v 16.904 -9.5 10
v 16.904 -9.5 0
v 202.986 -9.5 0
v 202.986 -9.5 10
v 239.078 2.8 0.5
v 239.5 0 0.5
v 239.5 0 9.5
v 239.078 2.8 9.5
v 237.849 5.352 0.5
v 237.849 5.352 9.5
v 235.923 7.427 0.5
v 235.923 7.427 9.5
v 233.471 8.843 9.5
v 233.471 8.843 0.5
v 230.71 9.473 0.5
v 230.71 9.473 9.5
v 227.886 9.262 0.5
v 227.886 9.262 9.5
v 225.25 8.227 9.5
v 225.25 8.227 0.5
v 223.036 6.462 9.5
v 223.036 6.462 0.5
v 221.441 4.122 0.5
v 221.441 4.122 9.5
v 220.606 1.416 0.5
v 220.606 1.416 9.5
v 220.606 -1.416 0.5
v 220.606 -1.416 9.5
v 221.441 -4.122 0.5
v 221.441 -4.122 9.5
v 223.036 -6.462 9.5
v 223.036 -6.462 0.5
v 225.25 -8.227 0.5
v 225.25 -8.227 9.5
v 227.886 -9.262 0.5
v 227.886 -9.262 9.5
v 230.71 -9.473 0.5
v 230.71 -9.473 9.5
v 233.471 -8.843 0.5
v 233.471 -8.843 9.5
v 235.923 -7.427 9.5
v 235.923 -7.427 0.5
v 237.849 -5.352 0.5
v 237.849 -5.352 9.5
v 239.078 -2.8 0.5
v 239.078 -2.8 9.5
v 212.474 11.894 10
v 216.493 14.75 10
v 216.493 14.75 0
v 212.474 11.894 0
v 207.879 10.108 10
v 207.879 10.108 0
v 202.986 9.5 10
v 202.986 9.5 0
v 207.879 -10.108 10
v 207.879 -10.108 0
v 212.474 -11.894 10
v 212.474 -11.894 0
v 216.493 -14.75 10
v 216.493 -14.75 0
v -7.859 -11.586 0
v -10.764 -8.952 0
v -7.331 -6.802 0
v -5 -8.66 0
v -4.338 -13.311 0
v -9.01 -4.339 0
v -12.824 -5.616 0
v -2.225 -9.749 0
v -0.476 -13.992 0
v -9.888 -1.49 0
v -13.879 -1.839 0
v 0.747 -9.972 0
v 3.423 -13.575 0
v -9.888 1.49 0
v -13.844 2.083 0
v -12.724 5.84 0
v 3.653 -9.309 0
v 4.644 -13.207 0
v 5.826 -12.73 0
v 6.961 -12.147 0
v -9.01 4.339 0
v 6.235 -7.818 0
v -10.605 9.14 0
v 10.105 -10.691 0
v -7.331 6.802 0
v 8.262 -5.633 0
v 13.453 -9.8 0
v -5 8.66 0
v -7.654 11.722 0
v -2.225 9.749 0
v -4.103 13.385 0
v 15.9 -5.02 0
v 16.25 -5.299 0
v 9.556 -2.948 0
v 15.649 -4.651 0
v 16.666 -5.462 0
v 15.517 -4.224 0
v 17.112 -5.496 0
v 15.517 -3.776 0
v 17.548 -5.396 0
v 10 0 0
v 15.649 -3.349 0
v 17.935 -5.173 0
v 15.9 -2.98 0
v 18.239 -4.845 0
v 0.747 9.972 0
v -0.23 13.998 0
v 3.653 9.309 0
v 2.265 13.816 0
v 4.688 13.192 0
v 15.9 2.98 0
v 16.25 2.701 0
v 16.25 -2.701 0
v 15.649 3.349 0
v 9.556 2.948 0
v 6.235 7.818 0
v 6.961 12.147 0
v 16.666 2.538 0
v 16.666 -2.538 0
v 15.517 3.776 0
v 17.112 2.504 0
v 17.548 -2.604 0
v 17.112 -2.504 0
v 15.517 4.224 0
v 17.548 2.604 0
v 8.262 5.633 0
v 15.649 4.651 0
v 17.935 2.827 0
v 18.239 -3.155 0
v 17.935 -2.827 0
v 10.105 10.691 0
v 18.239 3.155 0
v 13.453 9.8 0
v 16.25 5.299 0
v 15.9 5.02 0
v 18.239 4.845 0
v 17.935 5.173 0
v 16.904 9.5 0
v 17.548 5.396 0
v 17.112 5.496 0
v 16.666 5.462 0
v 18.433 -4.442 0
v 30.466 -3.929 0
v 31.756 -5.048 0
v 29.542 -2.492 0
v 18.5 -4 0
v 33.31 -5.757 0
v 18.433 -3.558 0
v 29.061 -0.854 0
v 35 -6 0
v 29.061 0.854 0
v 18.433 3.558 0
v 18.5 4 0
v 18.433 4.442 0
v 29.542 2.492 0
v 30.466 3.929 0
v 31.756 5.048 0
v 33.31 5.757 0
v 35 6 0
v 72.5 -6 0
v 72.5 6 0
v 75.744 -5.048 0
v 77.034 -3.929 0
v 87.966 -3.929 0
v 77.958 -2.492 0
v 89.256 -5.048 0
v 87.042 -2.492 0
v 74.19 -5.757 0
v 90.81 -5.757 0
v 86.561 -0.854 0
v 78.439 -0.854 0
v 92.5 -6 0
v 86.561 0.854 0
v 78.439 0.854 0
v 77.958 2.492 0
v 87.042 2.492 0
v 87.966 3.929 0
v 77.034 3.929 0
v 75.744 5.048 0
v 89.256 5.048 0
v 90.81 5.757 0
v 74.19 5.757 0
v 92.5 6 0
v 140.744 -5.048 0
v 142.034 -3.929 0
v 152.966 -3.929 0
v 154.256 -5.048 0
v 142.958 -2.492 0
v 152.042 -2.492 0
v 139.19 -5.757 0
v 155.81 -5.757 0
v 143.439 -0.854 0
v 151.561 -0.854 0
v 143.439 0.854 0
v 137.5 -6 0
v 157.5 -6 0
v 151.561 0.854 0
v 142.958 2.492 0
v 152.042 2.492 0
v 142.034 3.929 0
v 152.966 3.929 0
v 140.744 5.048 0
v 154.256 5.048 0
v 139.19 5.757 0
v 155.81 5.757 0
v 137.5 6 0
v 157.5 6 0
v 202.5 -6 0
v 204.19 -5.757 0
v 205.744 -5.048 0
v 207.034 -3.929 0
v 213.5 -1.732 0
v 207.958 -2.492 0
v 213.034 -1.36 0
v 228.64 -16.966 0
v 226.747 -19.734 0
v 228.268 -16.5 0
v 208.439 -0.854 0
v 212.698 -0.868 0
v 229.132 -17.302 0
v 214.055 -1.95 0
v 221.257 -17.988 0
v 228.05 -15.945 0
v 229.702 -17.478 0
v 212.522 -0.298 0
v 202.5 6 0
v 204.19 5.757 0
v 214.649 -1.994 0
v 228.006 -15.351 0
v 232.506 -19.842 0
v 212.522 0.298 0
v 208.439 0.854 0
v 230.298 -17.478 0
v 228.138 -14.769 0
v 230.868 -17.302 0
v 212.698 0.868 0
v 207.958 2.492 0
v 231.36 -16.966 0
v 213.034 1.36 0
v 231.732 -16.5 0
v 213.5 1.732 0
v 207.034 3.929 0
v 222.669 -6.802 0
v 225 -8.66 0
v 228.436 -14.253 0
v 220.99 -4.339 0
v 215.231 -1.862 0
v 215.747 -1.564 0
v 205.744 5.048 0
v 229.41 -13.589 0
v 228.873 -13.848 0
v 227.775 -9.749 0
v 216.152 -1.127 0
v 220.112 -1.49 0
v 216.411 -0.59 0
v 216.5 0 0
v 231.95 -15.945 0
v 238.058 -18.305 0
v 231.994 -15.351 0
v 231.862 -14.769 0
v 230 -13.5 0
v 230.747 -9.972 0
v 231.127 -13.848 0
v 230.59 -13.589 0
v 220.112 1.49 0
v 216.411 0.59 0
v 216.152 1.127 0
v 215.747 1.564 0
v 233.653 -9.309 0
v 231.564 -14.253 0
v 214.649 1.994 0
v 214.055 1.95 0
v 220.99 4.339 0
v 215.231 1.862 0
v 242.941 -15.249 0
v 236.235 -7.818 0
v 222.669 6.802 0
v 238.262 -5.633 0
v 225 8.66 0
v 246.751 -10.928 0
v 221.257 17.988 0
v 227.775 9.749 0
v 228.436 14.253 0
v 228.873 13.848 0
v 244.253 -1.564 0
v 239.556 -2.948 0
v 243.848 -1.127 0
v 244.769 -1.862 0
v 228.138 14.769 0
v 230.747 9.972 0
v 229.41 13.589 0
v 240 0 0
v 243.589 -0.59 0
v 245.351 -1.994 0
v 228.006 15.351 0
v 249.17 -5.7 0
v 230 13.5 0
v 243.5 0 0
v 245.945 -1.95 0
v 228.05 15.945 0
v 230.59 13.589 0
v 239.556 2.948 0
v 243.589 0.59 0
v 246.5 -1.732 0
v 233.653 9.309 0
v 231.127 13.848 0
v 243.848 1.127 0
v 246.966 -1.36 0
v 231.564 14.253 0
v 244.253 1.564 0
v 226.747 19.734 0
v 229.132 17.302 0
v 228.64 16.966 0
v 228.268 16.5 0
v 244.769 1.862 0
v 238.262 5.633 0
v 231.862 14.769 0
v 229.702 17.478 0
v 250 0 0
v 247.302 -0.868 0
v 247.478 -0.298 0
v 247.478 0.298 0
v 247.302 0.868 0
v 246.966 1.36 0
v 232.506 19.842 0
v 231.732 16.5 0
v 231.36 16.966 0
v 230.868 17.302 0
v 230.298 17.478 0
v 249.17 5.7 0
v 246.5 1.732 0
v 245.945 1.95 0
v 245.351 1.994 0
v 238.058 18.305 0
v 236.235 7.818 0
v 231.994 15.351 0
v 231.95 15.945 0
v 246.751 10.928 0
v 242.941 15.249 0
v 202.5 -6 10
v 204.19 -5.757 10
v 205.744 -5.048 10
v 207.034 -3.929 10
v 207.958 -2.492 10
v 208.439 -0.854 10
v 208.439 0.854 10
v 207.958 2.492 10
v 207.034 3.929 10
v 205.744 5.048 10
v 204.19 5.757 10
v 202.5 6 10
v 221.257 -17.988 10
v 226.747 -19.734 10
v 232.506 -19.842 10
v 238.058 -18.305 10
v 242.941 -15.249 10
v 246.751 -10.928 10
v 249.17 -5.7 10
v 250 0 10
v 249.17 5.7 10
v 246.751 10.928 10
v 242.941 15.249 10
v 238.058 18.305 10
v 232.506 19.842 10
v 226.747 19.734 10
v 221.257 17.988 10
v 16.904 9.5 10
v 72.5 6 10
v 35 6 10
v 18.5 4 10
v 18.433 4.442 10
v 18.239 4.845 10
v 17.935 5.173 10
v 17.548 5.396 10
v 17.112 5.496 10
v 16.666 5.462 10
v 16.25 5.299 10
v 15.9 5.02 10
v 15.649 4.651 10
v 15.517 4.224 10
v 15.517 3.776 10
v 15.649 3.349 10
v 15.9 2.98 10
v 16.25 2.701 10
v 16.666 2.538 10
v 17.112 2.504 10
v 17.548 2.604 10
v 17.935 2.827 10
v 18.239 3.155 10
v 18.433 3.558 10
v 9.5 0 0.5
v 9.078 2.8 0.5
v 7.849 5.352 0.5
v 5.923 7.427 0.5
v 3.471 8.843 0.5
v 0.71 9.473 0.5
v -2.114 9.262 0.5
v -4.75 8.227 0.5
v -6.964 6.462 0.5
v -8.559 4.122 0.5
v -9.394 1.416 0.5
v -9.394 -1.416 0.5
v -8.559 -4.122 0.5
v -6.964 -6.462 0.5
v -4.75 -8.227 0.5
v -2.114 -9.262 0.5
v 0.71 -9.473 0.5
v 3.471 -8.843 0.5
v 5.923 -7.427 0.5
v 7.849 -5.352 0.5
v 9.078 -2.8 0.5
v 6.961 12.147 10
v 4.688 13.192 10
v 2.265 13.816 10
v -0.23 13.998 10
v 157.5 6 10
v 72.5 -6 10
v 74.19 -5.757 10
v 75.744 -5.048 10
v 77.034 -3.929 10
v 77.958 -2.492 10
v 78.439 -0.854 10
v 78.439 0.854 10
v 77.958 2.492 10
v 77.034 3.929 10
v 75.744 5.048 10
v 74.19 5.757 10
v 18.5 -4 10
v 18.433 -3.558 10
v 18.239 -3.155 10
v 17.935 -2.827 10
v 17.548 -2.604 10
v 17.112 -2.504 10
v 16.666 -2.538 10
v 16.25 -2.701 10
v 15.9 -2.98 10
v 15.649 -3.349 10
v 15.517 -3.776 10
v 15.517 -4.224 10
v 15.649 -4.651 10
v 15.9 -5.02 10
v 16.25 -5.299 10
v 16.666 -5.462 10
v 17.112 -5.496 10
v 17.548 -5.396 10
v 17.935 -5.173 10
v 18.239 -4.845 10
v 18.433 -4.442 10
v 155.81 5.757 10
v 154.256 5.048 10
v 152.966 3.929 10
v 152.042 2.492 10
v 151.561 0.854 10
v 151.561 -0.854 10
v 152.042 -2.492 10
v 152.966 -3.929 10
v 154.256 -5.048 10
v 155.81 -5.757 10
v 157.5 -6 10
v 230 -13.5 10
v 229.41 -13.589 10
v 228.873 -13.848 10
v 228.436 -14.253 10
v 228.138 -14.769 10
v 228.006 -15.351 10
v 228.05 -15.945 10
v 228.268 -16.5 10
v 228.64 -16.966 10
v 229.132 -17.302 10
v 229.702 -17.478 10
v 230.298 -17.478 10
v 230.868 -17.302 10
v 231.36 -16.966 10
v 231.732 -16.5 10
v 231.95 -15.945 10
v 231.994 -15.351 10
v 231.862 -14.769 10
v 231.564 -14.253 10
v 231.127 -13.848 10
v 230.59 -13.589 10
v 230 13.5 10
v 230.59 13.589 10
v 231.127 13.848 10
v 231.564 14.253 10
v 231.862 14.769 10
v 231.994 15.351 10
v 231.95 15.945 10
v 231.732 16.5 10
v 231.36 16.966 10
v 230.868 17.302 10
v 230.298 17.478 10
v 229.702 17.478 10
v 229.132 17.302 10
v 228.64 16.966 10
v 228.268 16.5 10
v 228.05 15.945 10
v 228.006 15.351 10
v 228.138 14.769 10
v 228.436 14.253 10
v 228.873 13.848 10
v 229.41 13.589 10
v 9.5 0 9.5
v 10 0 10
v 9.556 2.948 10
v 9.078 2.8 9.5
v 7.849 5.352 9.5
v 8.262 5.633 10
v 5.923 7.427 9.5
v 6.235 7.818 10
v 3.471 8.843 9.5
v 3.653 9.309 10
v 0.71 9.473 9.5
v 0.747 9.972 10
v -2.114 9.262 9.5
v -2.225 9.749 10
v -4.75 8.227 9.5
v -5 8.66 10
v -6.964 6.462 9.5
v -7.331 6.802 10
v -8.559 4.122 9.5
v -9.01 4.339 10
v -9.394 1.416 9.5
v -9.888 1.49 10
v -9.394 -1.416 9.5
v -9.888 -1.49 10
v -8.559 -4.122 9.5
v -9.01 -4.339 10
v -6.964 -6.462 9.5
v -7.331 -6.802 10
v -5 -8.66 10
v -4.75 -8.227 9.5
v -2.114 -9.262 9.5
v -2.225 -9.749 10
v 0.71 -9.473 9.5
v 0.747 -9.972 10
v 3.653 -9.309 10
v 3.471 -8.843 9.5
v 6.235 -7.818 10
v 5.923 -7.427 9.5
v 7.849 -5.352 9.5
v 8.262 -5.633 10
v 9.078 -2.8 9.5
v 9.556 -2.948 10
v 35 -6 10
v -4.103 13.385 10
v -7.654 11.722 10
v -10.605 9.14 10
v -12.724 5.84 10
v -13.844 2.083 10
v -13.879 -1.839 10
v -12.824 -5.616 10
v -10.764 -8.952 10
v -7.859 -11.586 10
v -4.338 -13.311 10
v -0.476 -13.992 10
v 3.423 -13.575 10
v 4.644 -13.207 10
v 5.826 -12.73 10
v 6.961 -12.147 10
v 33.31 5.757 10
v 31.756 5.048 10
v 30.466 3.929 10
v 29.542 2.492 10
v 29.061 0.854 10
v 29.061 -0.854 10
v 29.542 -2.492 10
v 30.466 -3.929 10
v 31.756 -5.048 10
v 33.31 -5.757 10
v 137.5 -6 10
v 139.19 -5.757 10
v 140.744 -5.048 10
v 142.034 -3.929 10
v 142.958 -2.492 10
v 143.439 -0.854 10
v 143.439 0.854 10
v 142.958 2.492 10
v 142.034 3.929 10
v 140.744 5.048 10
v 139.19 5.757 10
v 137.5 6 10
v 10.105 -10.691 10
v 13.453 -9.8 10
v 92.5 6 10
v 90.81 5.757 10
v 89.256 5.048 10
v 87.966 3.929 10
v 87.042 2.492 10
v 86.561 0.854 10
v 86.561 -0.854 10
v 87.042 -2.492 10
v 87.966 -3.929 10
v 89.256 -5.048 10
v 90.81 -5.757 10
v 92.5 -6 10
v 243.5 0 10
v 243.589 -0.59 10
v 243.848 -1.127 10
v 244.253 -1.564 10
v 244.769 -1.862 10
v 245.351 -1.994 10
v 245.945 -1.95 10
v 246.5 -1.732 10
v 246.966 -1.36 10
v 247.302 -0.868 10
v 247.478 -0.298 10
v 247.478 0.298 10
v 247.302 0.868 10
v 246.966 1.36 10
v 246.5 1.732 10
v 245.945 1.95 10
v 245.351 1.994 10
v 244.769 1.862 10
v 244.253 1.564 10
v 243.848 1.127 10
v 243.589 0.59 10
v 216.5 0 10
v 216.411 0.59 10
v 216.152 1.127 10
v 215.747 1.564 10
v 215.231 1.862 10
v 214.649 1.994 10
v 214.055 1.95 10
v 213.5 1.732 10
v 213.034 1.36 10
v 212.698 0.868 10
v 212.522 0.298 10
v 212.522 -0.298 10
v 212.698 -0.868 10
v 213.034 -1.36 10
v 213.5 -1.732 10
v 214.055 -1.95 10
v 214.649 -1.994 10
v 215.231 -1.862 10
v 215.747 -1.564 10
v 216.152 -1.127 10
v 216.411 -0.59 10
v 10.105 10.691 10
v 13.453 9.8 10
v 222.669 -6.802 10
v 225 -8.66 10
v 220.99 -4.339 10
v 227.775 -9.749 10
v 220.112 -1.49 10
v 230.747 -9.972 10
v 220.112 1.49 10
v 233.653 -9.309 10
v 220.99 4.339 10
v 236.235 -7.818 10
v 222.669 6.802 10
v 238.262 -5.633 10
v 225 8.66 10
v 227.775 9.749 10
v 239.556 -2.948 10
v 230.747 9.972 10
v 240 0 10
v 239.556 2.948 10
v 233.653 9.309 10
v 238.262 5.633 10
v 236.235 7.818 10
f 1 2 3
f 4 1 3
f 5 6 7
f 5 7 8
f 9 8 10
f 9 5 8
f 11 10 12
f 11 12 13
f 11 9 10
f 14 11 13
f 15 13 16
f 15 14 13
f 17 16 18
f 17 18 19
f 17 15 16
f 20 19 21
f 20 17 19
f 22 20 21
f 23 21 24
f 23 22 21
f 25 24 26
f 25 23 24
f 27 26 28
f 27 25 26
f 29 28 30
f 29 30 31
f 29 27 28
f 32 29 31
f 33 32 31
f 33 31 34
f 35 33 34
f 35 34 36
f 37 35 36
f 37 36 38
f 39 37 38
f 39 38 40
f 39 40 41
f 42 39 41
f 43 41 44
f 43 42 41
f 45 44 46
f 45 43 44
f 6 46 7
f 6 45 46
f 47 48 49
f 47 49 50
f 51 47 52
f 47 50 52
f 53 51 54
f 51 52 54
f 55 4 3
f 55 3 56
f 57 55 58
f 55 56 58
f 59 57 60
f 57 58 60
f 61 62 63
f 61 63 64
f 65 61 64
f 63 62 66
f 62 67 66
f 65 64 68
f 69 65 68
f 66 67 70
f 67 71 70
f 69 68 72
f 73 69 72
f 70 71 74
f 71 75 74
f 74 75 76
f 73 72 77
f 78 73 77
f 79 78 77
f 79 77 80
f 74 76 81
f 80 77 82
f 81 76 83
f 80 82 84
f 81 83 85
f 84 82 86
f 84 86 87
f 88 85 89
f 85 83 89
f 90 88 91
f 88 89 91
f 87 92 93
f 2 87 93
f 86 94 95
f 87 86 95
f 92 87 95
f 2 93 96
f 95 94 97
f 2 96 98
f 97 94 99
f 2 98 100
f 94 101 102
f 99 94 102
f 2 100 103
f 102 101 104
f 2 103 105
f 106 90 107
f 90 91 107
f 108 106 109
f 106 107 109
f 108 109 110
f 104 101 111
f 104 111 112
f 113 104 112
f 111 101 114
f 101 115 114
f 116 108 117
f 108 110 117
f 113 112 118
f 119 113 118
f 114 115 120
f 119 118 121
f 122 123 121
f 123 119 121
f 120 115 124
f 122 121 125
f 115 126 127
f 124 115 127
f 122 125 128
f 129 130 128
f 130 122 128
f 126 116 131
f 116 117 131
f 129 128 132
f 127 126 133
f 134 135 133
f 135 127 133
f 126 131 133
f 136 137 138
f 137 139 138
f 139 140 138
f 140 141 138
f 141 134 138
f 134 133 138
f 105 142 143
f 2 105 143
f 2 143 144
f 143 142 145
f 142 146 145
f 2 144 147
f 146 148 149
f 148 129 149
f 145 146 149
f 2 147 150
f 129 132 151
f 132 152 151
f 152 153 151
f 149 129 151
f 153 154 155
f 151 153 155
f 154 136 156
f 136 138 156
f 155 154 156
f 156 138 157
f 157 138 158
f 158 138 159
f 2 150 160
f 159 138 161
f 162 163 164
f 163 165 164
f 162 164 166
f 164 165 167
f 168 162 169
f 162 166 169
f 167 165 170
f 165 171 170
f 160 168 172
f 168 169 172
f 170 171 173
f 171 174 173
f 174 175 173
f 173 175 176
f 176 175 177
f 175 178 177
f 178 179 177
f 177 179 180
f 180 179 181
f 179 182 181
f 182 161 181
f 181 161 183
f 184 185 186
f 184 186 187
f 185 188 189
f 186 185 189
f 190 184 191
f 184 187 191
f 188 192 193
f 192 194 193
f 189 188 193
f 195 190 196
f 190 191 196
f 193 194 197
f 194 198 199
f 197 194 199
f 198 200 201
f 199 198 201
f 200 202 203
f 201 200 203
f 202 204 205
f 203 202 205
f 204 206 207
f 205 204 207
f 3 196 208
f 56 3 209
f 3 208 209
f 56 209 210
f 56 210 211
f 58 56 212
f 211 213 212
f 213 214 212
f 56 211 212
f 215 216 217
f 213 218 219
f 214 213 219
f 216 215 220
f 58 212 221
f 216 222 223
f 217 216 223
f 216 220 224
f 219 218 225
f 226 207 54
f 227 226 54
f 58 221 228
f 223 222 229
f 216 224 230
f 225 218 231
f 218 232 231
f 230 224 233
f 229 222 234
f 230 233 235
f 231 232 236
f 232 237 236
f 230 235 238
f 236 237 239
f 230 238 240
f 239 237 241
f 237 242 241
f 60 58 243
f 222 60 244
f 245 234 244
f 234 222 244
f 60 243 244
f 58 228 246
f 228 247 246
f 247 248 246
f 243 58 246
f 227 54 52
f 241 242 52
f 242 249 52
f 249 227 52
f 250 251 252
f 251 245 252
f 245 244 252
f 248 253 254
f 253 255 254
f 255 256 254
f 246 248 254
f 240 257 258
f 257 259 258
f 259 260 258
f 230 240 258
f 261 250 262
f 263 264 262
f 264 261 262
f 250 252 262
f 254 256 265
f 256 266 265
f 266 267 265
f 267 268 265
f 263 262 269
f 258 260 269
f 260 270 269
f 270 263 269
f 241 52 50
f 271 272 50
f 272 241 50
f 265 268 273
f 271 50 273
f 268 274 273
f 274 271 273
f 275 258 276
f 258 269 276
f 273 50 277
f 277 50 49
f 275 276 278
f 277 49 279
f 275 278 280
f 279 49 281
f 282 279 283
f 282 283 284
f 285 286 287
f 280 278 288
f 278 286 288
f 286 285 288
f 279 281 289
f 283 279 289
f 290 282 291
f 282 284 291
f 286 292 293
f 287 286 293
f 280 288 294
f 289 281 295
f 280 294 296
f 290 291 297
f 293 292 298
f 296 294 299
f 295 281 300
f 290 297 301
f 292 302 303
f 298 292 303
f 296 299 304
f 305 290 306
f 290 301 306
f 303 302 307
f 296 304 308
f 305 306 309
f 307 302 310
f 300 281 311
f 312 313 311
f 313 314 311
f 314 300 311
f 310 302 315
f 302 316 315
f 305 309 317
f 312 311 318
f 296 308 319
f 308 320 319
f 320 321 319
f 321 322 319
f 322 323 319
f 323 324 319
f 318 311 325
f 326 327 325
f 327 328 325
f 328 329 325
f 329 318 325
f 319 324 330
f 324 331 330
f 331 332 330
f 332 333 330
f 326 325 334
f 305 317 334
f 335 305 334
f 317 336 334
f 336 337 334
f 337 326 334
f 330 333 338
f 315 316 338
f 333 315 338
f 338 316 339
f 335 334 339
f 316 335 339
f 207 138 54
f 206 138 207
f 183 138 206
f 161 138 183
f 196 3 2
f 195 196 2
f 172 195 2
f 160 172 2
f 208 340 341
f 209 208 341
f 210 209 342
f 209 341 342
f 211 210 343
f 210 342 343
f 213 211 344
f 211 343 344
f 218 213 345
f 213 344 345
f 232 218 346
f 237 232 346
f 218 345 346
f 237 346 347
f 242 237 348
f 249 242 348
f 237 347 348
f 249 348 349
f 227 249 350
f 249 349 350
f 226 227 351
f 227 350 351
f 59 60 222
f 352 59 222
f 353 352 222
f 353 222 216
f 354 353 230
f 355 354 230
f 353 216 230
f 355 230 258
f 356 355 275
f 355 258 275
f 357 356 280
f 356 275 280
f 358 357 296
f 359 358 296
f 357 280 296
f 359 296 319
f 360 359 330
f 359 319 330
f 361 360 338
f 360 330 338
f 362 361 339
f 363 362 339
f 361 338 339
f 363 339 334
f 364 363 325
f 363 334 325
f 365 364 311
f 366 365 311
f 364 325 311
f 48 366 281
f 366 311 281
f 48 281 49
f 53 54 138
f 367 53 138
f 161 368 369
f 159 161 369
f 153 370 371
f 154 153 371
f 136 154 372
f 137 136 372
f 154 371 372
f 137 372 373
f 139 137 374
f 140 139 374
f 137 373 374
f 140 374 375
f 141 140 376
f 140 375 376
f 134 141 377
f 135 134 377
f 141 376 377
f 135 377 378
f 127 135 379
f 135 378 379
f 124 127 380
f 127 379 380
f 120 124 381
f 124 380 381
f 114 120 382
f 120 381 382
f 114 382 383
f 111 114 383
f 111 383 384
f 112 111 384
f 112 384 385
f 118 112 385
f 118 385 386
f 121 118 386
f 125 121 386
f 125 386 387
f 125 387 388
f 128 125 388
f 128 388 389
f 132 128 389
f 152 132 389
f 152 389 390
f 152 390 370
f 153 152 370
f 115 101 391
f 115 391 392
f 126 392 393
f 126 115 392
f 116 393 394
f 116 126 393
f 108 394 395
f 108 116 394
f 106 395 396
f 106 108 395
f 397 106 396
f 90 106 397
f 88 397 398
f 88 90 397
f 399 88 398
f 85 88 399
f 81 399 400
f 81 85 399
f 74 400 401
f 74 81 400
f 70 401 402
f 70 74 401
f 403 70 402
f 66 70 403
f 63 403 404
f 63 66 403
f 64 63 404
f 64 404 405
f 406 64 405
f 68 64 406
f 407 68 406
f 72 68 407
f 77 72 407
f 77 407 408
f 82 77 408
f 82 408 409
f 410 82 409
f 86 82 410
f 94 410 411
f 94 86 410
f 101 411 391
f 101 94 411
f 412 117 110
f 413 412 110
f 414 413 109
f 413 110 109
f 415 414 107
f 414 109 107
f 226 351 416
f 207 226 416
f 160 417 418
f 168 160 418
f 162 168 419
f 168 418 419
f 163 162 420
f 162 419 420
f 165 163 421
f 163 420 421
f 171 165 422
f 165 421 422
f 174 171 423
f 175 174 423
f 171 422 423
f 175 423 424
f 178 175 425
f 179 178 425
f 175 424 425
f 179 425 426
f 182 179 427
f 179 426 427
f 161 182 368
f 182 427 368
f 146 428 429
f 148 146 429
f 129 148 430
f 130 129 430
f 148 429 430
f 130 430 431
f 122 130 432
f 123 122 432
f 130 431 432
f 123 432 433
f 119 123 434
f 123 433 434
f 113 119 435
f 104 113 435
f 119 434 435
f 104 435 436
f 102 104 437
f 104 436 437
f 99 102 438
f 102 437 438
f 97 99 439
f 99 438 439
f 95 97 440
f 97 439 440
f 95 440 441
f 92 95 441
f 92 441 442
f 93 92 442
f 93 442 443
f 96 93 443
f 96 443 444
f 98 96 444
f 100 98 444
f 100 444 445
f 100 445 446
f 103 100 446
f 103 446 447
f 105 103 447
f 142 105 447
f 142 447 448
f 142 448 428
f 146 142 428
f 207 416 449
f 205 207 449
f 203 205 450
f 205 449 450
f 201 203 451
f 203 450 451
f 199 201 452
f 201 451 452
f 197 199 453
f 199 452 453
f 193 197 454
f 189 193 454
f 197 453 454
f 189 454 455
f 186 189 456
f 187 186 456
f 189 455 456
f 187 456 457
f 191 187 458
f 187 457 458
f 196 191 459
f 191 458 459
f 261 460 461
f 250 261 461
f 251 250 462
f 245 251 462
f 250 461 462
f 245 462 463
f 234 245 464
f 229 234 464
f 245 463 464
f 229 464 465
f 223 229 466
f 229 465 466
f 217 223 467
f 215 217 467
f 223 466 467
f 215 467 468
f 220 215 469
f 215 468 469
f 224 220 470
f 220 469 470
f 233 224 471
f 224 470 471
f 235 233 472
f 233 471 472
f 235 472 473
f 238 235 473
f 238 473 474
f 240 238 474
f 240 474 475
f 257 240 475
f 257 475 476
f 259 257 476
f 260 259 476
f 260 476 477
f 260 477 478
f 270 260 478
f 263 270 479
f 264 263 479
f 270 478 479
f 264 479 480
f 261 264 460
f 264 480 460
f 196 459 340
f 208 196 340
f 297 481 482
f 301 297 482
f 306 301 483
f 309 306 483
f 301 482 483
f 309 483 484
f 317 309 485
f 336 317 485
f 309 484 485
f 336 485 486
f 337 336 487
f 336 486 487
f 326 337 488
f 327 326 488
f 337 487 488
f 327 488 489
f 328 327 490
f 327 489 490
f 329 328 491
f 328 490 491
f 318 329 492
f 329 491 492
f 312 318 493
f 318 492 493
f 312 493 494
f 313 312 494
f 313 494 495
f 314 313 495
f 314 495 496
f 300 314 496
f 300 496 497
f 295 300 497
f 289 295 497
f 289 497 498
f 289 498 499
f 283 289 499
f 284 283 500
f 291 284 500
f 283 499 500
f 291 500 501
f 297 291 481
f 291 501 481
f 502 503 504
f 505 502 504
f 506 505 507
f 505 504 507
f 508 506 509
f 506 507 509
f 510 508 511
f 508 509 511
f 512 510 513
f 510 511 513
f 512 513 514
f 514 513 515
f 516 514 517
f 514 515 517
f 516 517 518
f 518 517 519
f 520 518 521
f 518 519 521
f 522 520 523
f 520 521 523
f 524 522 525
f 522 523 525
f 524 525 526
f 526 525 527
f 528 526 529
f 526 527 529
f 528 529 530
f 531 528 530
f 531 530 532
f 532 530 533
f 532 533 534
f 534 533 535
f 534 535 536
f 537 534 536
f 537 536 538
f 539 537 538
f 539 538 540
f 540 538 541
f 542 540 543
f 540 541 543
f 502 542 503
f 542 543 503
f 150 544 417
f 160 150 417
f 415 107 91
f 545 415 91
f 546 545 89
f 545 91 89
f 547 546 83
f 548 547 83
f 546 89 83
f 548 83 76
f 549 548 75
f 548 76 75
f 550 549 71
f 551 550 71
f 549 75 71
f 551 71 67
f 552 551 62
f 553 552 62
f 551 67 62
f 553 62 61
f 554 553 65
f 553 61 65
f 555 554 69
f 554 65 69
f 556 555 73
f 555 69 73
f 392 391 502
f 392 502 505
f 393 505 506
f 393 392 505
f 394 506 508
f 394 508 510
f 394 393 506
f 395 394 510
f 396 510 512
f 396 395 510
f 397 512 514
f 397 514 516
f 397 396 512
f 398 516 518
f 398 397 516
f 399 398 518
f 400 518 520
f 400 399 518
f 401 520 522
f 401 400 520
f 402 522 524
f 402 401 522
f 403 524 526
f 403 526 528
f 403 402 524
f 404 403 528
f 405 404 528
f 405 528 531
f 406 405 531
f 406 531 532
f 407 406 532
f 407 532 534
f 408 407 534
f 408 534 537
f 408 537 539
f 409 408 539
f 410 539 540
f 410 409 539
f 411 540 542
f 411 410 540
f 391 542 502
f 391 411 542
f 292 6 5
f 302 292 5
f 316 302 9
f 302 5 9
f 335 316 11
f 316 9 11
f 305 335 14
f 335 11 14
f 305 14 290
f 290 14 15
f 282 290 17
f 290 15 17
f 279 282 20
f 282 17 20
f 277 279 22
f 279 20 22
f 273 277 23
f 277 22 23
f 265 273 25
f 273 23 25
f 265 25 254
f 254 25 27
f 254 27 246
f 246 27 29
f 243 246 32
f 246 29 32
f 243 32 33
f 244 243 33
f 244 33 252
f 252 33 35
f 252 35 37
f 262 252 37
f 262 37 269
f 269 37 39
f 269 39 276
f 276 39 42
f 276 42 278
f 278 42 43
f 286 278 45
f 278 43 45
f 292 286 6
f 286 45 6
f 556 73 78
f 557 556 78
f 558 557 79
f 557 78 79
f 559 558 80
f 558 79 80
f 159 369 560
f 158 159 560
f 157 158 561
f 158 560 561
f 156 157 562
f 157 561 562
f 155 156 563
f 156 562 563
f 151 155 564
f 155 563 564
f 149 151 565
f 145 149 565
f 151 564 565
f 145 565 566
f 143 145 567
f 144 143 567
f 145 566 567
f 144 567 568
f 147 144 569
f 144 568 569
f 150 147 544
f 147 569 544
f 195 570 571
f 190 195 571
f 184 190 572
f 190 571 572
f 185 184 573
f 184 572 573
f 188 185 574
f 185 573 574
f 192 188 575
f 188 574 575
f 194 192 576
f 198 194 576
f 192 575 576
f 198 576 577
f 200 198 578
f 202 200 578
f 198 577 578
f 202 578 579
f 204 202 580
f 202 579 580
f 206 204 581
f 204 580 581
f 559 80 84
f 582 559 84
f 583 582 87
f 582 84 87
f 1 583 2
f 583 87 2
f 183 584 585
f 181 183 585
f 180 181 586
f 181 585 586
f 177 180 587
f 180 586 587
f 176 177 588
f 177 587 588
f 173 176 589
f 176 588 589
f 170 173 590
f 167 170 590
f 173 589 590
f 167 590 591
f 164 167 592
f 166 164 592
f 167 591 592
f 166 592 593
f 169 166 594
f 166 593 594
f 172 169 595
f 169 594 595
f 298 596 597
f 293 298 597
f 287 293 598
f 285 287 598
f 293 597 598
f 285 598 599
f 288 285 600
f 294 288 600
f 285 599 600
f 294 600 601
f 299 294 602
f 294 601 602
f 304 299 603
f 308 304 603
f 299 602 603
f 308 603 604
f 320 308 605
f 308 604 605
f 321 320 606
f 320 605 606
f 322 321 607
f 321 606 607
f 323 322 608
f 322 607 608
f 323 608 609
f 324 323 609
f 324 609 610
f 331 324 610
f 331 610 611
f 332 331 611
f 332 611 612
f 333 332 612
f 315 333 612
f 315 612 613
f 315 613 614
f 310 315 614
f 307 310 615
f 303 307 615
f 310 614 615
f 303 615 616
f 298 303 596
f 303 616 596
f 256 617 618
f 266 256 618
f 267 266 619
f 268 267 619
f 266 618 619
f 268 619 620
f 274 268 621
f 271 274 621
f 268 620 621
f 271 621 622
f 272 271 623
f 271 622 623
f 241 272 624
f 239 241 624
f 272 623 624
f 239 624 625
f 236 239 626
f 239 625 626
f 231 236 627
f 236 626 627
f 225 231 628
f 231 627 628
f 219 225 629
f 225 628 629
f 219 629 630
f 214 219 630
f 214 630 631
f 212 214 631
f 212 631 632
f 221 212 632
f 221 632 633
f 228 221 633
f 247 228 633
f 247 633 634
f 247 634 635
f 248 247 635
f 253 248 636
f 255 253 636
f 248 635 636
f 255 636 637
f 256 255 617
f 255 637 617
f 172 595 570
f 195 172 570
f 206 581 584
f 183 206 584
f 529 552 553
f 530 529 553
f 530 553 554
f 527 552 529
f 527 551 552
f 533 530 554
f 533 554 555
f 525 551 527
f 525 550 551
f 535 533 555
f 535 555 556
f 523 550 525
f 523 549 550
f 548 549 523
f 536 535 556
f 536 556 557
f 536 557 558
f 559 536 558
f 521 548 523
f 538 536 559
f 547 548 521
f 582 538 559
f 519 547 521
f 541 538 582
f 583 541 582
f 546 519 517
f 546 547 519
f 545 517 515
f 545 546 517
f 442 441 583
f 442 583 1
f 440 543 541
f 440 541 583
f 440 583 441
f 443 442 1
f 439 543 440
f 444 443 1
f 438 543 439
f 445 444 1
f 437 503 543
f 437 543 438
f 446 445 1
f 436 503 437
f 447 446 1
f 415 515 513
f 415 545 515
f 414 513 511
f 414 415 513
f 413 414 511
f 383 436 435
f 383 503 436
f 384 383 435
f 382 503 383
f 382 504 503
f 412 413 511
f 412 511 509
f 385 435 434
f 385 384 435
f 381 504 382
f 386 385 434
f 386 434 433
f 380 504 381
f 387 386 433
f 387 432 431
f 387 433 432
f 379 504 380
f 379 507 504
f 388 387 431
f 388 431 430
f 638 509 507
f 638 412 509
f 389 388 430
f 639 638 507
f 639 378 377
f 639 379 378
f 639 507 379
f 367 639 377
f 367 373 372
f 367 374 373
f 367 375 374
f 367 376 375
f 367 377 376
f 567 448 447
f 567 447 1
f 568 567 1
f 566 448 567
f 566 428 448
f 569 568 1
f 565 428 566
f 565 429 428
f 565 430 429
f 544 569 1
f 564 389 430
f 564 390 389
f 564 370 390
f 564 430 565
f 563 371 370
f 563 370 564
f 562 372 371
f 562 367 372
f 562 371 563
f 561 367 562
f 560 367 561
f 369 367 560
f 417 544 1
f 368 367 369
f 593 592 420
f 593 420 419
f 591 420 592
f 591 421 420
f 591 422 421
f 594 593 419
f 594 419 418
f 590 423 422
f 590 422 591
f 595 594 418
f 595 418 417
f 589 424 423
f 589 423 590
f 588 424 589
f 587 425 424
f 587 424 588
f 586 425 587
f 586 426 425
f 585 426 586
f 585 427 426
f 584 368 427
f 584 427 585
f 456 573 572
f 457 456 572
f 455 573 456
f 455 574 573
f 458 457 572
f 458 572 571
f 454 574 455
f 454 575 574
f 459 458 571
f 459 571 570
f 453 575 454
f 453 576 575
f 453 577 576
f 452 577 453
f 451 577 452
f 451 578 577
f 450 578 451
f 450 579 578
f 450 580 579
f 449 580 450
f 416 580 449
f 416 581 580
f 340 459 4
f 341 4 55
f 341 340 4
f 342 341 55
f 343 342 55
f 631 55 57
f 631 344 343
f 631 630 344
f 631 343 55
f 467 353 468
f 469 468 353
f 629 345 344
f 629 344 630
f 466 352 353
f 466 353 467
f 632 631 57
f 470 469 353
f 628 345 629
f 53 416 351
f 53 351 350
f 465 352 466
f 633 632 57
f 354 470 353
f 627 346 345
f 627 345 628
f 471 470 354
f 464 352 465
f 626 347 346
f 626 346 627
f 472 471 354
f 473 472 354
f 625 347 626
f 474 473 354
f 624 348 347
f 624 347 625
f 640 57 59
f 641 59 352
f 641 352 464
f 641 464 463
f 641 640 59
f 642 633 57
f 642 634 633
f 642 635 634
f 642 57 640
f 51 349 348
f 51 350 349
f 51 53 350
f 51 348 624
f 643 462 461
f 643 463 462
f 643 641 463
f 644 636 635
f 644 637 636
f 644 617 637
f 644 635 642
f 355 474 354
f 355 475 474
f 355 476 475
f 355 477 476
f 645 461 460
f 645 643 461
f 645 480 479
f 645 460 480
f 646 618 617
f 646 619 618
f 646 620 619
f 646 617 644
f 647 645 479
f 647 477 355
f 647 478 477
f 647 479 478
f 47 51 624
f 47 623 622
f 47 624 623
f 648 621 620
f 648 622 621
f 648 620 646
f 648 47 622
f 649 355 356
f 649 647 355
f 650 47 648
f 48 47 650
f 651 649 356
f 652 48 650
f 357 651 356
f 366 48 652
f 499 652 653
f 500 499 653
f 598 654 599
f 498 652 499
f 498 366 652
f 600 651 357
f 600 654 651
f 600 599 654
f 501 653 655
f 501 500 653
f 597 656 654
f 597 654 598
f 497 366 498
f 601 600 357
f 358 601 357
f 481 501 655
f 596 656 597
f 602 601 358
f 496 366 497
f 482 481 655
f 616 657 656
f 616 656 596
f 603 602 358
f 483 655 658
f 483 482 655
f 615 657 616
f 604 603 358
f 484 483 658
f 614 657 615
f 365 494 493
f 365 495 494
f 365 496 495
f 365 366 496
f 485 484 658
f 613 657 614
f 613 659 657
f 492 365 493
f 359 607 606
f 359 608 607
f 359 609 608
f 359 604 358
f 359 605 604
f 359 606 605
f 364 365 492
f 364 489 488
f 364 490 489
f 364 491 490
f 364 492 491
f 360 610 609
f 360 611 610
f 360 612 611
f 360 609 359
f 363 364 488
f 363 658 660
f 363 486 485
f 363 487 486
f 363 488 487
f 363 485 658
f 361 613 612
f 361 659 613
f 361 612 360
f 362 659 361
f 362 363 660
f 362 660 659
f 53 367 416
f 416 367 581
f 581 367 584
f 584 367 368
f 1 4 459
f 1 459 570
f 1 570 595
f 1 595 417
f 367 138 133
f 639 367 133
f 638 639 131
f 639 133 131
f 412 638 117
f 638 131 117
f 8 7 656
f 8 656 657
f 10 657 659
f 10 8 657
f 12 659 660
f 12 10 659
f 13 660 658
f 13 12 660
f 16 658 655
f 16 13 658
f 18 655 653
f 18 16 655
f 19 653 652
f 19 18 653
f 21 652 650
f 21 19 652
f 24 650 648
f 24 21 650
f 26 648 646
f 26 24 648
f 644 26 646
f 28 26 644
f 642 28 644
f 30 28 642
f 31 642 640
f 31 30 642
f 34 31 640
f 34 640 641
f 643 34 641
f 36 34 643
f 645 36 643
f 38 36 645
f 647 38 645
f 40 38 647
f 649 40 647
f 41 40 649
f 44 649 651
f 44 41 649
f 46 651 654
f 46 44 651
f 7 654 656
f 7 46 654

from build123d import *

# Parameters (mm, degrees)
SKETCH_1_R               = 9.5
EXTRUDE_2_DEPTH          = 10
CHAMFER_1_SIZE           = 0.5
CUT_EXTRUDE_1_DEPTH      = 10
SKETCH_3_R               = 2
CUT_EXTRUDE_2_DEPTH      = 10
CHAMFER_2_SIZE           = 0.5
SKETCH_5_R               = 2
CUT_EXTRUDE_3_DEPTH      = 10
CHAMFER_3_SIZE           = 0.5
SKETCH_9_R               = 2
EXTRUDE_3_DEPTH          = 10
CUT_EXTRUDE_6_DEPTH      = 10
PATTERN_CIRCULAR_2_COUNT = 4
SKETCH_11_R              = 1.5
CUT_EXTRUDE_7_DEPTH      = 251.99800796


with BuildPart() as part:
    # 草图1 → 凸台-拉伸2 (new body)
    with BuildSketch(Plane.XY):
        with BuildLine():
            Line((20.821645942, -9.5), (202.986114682, -9.5))
            ThreePointArc((202.986114682, -9.5), (210.231803055, -10.858648118), (216.493057341, -14.75))
            ThreePointArc((216.493057341, -14.75), (250, 0), (216.493057341, 14.75))
            ThreePointArc((216.493057341, 14.75), (210.231803055, 10.858648118), (202.986114682, 9.5))
            Line((202.986114682, 9.5), (21.63860854, 9.5))
            Line((21.63860854, 9.5), (16.904141504, 9.5))
            ThreePointArc((16.904141504, 9.5), (11.75918395, 10.173090993), (6.960528855, 12.147058824))
            ThreePointArc((6.960528855, 12.147058824), (3.490452231, 13.557903349), (-0.229510749, 13.998118617))
            ThreePointArc((-0.229510749, 13.998118617), (-13.878745314, -1.838594167), (3.423256182, -13.575025492))
            ThreePointArc((3.423256182, -13.575025492), (5.240755683, -12.982083033), (6.960528855, -12.147058824))
            ThreePointArc((6.960528855, -12.147058824), (11.75918395, -10.173090993), (16.904141504, -9.5))
            Line((16.904141504, -9.5), (20.821645942, -9.5))
        make_face()
        Circle(SKETCH_1_R, mode=Mode.SUBTRACT)
        with Locations((230, 0)):
            Circle(SKETCH_1_R, mode=Mode.SUBTRACT)
    extrude(amount=EXTRUDE_2_DEPTH)

    # 倒角1
    chamfer_1_edges = [part.edges().sort_by_distance(p)[0] for p in [
        (-9.5, 0, 10),
        (-9.5, 0, 0),
    ]]
    chamfer(chamfer_1_edges, length=CHAMFER_1_SIZE)

    # 草图2 → 切除-拉伸1 (cut)
    with BuildSketch(Plane.XY.offset(10)):
        with BuildLine():
            Line((92.5, -6), (137.5, -6))
            ThreePointArc((137.5, -6), (143.5, 0), (137.5, 6))
            Line((137.5, 6), (92.5, 6))
            ThreePointArc((92.5, 6), (86.5, 0), (92.5, -6))
        make_face()
        with BuildLine():
            Line((157.5, -6), (202.5, -6))
            ThreePointArc((202.5, -6), (208.5, 0), (202.5, 6))
            Line((202.5, 6), (157.5, 6))
            ThreePointArc((157.5, 6), (151.5, 0), (157.5, -6))
        make_face()
        with BuildLine():
            Line((35, -6), (72.5, -6))
            ThreePointArc((72.5, -6), (78.5, 0), (72.5, 6))
            Line((72.5, 6), (35, 6))
            ThreePointArc((35, 6), (29, 0), (35, -6))
        make_face()
    extrude(amount=-CUT_EXTRUDE_1_DEPTH, mode=Mode.SUBTRACT)

    # 草图3 → 切除-拉伸2 (cut)
    with BuildSketch(Plane.XY.offset(10)):
        with Locations((222.5, 12.990381057)):
            Circle(SKETCH_3_R)
        with Locations((237.5, 12.990381057)):
            Circle(SKETCH_3_R)
        with Locations((245, 0)):
            Circle(SKETCH_3_R)
    extrude(amount=-CUT_EXTRUDE_2_DEPTH, mode=Mode.SUBTRACT)

    # 倒角2
    chamfer_2_edges = [part.edges().sort_by_distance(p)[0] for p in [
        (220.5, 0, 10),
    ]]
    chamfer(chamfer_2_edges, length=CHAMFER_2_SIZE)

    # 草图5 → 切除-拉伸3 (cut)
    with BuildSketch(Plane.XY.offset(10)):
        with Locations((215, 0)):
            Circle(SKETCH_5_R)
        with Locations((222.5, -12.990381057)):
            Circle(SKETCH_5_R)
        with Locations((237.5, -12.990381057)):
            Circle(SKETCH_5_R)
    extrude(amount=-CUT_EXTRUDE_3_DEPTH, mode=Mode.SUBTRACT)

    # 倒角3
    chamfer_3_edges = [part.edges().sort_by_distance(p)[0] for p in [
        (220.5, 0, 0),
    ]]
    chamfer(chamfer_3_edges, length=CHAMFER_3_SIZE)

    # 草图9 → 凸台-拉伸3 (add)
    with BuildSketch(Plane.XY.offset(10)):
        with Locations((215, 0)):
            Circle(SKETCH_9_R)
        with Locations((222.5, 12.990381057)):
            Circle(SKETCH_9_R)
        with Locations((237.5, 12.990381057)):
            Circle(SKETCH_9_R)
        with Locations((245, 0)):
            Circle(SKETCH_9_R)
        with Locations((237.5, -12.990381057)):
            Circle(SKETCH_9_R)
        with Locations((222.5, -12.990381057)):
            Circle(SKETCH_9_R)
    extrude(amount=-EXTRUDE_3_DEPTH)

    # 草图10 → 切除-拉伸6 (cut)
    with BuildSketch(Plane.XY.offset(10)):
        with BuildLine():
            ThreePointArc((214.629032258, -1.995833329), (215.959120371, -1.367833229), (216.5, 0))
            ThreePointArc((216.5, 0), (215.959120371, 1.367833229), (214.629032258, 1.995833329))
            ThreePointArc((214.629032258, 1.995833329), (212.5, 0), (214.629032258, -1.995833329))
        make_face()
    cut_extrude_6 = extrude(amount=-CUT_EXTRUDE_6_DEPTH, mode=Mode.SUBTRACT)

    # 阵列(圆周)2: 切除-拉伸6 ×4 about axis
    pattern_circular_2_axis = Axis((230, 0, 9.5), (0, 0, -1))
    for i in range(1, PATTERN_CIRCULAR_2_COUNT):
        add(cut_extrude_6.rotate(pattern_circular_2_axis, i * 360 / PATTERN_CIRCULAR_2_COUNT), mode=Mode.SUBTRACT)

    # 草图11 → 切除-拉伸7 (cut, through all)
    with BuildSketch(Plane.XY.offset(10)):
        with Locations((17, 4)):
            Circle(SKETCH_11_R)
        with Locations((17, -4)):
            Circle(SKETCH_11_R)
    extrude(amount=-CUT_EXTRUDE_7_DEPTH, mode=Mode.SUBTRACT)


solid = part.part
